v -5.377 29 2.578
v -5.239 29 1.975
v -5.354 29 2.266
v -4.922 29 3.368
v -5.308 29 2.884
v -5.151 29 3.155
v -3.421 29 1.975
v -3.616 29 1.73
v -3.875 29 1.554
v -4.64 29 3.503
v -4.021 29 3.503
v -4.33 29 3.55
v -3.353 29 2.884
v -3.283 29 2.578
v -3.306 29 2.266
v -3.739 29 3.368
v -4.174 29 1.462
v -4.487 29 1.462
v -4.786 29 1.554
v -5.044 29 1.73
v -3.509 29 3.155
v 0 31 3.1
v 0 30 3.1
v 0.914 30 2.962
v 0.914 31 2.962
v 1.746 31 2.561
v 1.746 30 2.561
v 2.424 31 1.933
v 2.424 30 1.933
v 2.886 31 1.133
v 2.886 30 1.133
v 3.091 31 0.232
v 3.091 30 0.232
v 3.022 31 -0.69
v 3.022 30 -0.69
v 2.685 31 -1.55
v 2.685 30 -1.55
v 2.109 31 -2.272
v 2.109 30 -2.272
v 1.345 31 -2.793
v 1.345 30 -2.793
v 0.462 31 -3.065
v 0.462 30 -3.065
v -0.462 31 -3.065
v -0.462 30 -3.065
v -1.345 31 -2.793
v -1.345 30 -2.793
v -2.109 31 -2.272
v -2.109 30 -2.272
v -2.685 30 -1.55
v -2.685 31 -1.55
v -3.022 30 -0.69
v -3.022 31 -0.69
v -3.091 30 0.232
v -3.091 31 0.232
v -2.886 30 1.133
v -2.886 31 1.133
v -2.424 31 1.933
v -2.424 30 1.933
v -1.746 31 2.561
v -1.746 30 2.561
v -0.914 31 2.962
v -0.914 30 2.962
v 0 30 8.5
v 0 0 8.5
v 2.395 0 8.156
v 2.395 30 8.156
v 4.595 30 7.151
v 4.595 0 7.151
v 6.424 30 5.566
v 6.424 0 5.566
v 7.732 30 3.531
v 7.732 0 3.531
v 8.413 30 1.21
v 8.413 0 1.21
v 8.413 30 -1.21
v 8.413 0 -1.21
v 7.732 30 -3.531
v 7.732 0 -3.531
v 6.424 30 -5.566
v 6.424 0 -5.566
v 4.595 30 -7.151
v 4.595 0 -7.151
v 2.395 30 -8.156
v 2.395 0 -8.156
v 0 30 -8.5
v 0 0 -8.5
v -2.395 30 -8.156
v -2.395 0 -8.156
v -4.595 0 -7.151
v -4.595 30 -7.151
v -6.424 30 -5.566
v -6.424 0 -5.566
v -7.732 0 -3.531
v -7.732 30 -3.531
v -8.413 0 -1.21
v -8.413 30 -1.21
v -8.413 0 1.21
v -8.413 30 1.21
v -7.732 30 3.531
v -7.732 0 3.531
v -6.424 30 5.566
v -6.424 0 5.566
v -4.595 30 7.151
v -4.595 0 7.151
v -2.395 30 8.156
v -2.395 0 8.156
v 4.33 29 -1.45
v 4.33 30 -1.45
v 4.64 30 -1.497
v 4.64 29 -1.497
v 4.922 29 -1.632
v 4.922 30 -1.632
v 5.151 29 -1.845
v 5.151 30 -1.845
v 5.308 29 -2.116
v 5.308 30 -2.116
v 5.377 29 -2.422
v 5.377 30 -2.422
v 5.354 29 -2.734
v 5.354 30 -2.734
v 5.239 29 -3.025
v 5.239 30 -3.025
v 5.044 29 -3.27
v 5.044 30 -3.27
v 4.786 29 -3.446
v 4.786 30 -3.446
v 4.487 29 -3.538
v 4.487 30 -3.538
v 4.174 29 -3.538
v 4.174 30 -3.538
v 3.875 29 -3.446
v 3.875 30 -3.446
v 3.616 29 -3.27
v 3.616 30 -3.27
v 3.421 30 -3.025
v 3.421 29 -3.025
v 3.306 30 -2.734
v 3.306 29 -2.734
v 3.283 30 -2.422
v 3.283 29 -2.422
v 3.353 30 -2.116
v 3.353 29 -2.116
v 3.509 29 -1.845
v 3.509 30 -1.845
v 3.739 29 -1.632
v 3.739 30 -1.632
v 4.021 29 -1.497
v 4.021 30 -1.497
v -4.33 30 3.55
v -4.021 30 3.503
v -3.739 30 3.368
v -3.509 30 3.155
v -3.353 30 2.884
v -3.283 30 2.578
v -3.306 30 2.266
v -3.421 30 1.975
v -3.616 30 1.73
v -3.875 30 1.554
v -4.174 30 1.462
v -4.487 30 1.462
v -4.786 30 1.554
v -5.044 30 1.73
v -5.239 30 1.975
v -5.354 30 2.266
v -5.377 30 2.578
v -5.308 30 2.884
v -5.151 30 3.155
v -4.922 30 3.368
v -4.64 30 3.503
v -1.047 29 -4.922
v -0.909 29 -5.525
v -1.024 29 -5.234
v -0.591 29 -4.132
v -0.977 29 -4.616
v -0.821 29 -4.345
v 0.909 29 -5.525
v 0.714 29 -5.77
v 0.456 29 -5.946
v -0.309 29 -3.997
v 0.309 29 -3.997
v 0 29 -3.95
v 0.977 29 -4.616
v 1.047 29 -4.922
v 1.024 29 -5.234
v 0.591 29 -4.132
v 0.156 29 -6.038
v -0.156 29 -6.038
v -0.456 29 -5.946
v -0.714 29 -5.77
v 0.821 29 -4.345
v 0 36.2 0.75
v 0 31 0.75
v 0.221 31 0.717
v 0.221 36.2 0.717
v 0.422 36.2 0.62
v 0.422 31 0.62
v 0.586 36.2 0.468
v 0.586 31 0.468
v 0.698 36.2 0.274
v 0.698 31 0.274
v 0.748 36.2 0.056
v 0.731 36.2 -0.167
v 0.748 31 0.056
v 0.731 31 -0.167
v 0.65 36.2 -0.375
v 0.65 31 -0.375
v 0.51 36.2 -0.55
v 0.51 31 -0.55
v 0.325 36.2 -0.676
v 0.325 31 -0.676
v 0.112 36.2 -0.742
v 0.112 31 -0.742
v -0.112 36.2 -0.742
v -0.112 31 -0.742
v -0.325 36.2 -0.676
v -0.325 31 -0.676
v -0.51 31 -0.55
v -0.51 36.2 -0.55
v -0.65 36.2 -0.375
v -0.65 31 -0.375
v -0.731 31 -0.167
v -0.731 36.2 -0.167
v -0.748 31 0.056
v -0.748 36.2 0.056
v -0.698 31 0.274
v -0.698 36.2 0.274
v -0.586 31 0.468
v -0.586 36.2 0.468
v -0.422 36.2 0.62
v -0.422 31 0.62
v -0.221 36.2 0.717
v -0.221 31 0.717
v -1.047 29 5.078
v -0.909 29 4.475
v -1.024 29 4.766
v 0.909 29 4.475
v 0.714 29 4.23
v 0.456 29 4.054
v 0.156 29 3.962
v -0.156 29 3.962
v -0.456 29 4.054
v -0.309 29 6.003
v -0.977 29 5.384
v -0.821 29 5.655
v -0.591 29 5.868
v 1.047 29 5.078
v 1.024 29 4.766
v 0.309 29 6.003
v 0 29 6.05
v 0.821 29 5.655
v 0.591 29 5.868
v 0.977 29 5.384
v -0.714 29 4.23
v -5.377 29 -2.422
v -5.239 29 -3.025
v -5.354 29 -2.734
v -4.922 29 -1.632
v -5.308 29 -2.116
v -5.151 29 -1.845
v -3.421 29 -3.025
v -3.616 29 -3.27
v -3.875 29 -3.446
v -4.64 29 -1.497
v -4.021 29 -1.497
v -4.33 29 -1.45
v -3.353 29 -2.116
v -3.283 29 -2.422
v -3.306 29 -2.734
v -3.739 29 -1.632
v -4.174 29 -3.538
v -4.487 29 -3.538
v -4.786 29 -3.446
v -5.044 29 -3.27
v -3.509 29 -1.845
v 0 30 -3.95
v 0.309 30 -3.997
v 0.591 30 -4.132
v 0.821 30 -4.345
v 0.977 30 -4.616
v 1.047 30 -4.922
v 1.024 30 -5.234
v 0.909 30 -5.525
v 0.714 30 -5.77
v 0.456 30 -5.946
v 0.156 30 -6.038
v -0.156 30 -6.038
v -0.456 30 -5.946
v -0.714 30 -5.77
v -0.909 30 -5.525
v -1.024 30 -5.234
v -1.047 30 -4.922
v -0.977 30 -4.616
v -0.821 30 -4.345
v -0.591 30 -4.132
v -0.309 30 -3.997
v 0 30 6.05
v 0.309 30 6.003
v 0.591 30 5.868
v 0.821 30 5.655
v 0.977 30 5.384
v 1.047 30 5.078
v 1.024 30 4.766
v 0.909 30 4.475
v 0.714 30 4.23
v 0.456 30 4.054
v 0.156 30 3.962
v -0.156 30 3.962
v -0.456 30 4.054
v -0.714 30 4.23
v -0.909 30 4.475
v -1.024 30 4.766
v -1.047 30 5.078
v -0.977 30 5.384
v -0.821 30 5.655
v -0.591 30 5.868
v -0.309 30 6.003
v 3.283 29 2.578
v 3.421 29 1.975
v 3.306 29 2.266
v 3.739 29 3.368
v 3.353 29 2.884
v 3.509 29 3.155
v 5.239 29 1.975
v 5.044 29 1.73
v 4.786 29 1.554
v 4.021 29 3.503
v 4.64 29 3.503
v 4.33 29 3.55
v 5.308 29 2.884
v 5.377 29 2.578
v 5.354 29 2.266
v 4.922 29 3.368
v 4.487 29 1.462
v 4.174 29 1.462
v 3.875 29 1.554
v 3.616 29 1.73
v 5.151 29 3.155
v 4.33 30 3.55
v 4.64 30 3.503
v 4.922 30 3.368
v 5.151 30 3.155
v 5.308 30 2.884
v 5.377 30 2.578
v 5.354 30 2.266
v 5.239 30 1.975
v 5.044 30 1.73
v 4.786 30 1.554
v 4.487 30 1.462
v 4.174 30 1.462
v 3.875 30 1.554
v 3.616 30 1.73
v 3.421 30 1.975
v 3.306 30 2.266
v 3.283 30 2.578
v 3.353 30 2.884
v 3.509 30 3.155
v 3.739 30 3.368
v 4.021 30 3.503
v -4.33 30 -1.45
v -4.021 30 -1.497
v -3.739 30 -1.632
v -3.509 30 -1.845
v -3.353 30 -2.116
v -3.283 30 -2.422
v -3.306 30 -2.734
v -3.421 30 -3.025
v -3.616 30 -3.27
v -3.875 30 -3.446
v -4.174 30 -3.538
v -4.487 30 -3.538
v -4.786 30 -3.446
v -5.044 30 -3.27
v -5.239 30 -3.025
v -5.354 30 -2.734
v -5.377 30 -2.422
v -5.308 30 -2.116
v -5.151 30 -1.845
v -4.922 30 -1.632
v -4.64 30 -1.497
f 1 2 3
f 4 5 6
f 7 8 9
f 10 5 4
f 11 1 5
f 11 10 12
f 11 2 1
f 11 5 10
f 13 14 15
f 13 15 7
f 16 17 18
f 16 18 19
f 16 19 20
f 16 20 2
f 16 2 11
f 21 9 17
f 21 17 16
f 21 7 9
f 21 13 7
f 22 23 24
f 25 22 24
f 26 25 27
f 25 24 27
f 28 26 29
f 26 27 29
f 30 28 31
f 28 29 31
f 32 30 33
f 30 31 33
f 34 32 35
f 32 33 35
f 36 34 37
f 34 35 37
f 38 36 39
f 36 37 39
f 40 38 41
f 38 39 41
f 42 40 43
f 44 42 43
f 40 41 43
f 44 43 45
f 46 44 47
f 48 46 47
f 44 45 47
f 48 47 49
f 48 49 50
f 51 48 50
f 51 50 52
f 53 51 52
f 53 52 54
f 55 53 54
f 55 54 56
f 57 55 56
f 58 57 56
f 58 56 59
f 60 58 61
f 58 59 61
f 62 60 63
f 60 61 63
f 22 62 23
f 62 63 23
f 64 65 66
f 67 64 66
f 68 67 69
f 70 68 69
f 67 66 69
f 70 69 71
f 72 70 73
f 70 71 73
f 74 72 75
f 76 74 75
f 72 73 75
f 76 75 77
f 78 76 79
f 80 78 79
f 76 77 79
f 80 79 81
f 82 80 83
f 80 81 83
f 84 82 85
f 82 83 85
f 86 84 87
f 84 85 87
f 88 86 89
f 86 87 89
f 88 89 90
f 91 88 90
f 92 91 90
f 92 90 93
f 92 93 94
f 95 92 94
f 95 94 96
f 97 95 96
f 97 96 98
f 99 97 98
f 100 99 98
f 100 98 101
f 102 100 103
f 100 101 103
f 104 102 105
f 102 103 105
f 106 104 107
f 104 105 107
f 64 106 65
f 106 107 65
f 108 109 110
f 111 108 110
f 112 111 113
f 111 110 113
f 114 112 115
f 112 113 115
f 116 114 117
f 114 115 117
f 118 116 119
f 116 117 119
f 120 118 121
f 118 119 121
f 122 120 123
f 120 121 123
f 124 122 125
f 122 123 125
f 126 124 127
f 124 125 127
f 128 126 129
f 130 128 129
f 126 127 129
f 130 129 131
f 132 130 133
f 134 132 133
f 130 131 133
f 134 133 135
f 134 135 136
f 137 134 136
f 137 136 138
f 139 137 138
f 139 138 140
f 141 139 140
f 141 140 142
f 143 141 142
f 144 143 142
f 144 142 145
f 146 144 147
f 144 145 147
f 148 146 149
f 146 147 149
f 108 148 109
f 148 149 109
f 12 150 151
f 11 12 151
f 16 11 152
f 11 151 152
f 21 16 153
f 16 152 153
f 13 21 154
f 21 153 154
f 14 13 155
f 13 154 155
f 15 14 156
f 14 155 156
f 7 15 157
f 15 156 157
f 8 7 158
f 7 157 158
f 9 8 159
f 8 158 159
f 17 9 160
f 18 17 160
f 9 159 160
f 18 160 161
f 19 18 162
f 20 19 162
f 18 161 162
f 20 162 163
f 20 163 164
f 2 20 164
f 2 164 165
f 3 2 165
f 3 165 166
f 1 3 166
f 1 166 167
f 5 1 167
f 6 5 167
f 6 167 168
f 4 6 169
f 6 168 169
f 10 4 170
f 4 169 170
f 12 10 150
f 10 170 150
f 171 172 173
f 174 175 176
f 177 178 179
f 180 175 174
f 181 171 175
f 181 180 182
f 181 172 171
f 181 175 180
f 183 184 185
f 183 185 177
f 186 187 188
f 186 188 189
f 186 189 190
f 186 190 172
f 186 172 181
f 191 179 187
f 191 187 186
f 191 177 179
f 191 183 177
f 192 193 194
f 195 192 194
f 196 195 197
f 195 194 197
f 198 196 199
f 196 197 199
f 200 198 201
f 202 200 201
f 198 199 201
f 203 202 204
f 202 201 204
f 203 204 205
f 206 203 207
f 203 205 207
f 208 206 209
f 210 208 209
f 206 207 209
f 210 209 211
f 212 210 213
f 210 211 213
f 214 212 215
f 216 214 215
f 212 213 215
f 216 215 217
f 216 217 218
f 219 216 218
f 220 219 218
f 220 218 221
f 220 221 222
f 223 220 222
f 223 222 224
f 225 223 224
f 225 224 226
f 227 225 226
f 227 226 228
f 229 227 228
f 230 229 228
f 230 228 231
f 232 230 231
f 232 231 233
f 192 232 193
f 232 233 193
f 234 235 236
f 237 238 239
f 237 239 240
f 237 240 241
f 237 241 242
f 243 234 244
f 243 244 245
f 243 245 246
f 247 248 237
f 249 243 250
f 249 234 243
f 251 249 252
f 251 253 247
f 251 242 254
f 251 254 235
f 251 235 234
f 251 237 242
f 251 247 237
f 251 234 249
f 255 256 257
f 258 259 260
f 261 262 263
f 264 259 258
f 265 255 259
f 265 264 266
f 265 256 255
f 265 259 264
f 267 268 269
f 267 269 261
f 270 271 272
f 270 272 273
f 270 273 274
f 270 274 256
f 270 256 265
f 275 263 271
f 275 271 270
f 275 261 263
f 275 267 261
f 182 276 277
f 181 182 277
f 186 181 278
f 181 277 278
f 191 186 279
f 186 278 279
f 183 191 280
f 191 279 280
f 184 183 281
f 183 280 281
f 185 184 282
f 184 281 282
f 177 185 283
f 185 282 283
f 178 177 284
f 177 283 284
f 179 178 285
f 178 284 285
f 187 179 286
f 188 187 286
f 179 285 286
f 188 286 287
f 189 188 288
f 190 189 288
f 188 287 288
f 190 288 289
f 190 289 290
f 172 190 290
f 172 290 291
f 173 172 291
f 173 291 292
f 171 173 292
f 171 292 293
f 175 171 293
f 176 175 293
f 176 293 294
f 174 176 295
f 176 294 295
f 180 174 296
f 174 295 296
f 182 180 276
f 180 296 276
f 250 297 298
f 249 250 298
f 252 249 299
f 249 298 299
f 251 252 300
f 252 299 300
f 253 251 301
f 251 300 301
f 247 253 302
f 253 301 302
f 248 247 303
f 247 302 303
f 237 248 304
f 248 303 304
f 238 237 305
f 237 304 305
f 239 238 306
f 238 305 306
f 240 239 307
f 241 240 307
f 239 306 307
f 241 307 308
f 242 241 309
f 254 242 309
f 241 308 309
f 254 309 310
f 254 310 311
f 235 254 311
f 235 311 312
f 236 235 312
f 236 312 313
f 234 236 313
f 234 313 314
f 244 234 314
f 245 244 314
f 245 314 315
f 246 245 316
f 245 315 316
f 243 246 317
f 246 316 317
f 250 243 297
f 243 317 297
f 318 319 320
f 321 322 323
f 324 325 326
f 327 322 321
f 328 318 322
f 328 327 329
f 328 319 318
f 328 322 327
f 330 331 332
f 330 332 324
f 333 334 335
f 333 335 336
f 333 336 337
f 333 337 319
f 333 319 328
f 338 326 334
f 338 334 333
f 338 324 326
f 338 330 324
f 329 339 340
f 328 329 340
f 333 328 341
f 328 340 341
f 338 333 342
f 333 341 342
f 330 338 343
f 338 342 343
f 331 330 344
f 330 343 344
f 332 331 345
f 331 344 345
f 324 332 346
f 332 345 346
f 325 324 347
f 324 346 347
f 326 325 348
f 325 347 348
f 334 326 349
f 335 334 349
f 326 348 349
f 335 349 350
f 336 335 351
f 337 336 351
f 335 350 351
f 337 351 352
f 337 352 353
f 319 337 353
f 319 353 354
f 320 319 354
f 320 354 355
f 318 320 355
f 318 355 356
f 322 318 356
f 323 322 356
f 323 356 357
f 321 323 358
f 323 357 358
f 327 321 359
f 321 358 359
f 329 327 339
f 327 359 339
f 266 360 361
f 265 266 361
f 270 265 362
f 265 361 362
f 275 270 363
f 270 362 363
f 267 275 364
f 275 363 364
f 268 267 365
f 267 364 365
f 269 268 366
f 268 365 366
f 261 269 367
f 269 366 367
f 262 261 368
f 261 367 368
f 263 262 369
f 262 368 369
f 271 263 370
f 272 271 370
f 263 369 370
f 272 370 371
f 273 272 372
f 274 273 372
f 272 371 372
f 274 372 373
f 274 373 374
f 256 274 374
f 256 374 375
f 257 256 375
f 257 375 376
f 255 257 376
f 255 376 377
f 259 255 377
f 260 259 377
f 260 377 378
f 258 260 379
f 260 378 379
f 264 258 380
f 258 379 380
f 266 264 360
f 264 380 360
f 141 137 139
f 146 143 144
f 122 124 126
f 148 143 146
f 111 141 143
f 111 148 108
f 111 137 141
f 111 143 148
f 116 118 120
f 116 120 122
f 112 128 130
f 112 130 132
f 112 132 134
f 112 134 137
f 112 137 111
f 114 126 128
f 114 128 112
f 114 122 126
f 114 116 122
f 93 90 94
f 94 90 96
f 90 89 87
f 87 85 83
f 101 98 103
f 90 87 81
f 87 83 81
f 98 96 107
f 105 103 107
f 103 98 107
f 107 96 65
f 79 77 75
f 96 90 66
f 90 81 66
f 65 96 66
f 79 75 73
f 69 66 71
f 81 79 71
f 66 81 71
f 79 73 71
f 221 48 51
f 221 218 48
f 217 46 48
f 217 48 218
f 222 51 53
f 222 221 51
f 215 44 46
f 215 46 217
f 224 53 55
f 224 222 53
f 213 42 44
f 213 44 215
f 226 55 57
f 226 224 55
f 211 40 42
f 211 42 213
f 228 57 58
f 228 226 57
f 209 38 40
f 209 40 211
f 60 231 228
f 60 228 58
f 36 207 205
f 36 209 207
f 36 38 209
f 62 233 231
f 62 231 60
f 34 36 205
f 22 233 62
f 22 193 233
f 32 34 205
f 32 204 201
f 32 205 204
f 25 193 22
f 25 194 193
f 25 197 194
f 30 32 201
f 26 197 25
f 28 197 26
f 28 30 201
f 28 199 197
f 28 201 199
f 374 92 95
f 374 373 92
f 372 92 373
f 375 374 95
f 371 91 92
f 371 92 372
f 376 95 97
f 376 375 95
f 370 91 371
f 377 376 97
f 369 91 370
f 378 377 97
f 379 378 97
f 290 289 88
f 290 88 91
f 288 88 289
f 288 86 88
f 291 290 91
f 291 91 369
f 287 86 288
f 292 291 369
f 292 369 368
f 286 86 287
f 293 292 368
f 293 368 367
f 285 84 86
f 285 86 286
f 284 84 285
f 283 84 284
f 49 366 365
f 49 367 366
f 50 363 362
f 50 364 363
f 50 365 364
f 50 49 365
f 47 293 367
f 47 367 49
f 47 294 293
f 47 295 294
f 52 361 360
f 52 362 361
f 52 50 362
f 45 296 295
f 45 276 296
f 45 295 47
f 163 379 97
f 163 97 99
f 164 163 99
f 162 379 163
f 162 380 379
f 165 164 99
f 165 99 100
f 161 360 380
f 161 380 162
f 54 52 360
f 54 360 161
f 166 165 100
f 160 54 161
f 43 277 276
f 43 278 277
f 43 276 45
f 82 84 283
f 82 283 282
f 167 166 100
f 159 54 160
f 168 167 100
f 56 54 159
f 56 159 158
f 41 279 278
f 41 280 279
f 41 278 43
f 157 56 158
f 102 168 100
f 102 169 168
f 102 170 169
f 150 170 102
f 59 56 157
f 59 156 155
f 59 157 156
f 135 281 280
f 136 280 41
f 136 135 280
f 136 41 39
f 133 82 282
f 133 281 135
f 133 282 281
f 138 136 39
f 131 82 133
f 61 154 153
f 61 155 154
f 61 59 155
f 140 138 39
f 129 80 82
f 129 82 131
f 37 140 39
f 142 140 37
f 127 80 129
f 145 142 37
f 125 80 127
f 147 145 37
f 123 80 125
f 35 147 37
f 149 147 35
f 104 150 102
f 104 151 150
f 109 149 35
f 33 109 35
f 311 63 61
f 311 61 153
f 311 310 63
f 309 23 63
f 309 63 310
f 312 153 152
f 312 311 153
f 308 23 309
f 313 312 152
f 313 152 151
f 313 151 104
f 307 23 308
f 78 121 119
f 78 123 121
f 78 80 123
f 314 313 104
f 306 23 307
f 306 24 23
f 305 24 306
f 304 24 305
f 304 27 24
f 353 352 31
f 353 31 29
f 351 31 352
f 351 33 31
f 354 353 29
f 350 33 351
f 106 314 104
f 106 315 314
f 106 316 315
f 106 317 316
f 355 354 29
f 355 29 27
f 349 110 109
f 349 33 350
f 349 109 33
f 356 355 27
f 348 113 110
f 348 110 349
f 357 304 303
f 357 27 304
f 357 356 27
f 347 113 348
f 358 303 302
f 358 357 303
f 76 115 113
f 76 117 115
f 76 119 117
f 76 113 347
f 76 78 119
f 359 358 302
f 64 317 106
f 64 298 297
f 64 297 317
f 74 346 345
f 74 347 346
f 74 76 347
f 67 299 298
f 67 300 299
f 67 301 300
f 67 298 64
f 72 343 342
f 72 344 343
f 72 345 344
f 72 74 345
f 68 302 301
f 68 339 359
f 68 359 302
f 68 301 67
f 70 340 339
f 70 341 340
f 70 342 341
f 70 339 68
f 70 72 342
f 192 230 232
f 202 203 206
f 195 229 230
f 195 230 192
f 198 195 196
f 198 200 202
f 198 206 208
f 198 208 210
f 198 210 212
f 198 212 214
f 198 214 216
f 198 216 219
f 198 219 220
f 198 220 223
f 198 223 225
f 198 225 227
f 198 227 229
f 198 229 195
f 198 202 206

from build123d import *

# Parameters (mm, degrees)
SKETCH_1_R          = 8.5
EXTRUDE_1_DEPTH     = 30
SKETCH_2_R          = 3.1
EXTRUDE_2_DEPTH     = 1
SKETCH_3_R          = 0.75
EXTRUDE_3_DEPTH     = 5.2
SKETCH_4_R          = 1.05
CUT_EXTRUDE_1_DEPTH = 1


with BuildPart() as part:
    # 草图1 → 凸台-拉伸1 (new body)
    with BuildSketch(Plane(origin=(0, 0, 0), x_dir=(1, 0, 0), z_dir=(0, 1, 0))):
        with Locations(Location((0, 0, 0), (0, 0, 270))):
            Circle(SKETCH_1_R)
    extrude(amount=EXTRUDE_1_DEPTH)

    # 草图2 → 凸台-拉伸2 (add)
    with BuildSketch(Plane(origin=(0, 30, 0), x_dir=(1, 0, 0), z_dir=(0, 1, 0))):
        with Locations(Location((0, 0, 0), (0, 0, 270))):
            Circle(SKETCH_2_R)
    extrude(amount=EXTRUDE_2_DEPTH)

    # 草图3 → 凸台-拉伸3 (add)
    with BuildSketch(Plane(origin=(0, 31, 0), x_dir=(1, 0, 0), z_dir=(0, 1, 0))):
        with Locations(Location((0, 0, 0), (0, 0, 270))):
            Circle(SKETCH_3_R)
    extrude(amount=EXTRUDE_3_DEPTH)

    # 草图4 → 切除-拉伸1 (cut)
    with BuildSketch(Plane(origin=(0, 30, 0), x_dir=(1, 0, 0), z_dir=(0, 1, 0))):
        with Locations(Location((0, 5, 0), (0, 0, 270))):
            Circle(SKETCH_4_R)
        with Locations(Location((4.330127019, 2.5, 0), (0, 0, 270))):
            Circle(SKETCH_4_R)
        with Locations(Location((4.330127019, -2.5, 0), (0, 0, 270))):
            Circle(SKETCH_4_R)
        with Locations(Location((0, -5, 0), (0, 0, 270))):
            Circle(SKETCH_4_R)
        with Locations(Location((-4.330127019, -2.5, 0), (0, 0, 270))):
            Circle(SKETCH_4_R)
        with Locations(Location((-4.330127019, 2.5, 0), (0, 0, 270))):
            Circle(SKETCH_4_R)
    extrude(amount=-CUT_EXTRUDE_1_DEPTH, mode=Mode.SUBTRACT)


solid = part.part
